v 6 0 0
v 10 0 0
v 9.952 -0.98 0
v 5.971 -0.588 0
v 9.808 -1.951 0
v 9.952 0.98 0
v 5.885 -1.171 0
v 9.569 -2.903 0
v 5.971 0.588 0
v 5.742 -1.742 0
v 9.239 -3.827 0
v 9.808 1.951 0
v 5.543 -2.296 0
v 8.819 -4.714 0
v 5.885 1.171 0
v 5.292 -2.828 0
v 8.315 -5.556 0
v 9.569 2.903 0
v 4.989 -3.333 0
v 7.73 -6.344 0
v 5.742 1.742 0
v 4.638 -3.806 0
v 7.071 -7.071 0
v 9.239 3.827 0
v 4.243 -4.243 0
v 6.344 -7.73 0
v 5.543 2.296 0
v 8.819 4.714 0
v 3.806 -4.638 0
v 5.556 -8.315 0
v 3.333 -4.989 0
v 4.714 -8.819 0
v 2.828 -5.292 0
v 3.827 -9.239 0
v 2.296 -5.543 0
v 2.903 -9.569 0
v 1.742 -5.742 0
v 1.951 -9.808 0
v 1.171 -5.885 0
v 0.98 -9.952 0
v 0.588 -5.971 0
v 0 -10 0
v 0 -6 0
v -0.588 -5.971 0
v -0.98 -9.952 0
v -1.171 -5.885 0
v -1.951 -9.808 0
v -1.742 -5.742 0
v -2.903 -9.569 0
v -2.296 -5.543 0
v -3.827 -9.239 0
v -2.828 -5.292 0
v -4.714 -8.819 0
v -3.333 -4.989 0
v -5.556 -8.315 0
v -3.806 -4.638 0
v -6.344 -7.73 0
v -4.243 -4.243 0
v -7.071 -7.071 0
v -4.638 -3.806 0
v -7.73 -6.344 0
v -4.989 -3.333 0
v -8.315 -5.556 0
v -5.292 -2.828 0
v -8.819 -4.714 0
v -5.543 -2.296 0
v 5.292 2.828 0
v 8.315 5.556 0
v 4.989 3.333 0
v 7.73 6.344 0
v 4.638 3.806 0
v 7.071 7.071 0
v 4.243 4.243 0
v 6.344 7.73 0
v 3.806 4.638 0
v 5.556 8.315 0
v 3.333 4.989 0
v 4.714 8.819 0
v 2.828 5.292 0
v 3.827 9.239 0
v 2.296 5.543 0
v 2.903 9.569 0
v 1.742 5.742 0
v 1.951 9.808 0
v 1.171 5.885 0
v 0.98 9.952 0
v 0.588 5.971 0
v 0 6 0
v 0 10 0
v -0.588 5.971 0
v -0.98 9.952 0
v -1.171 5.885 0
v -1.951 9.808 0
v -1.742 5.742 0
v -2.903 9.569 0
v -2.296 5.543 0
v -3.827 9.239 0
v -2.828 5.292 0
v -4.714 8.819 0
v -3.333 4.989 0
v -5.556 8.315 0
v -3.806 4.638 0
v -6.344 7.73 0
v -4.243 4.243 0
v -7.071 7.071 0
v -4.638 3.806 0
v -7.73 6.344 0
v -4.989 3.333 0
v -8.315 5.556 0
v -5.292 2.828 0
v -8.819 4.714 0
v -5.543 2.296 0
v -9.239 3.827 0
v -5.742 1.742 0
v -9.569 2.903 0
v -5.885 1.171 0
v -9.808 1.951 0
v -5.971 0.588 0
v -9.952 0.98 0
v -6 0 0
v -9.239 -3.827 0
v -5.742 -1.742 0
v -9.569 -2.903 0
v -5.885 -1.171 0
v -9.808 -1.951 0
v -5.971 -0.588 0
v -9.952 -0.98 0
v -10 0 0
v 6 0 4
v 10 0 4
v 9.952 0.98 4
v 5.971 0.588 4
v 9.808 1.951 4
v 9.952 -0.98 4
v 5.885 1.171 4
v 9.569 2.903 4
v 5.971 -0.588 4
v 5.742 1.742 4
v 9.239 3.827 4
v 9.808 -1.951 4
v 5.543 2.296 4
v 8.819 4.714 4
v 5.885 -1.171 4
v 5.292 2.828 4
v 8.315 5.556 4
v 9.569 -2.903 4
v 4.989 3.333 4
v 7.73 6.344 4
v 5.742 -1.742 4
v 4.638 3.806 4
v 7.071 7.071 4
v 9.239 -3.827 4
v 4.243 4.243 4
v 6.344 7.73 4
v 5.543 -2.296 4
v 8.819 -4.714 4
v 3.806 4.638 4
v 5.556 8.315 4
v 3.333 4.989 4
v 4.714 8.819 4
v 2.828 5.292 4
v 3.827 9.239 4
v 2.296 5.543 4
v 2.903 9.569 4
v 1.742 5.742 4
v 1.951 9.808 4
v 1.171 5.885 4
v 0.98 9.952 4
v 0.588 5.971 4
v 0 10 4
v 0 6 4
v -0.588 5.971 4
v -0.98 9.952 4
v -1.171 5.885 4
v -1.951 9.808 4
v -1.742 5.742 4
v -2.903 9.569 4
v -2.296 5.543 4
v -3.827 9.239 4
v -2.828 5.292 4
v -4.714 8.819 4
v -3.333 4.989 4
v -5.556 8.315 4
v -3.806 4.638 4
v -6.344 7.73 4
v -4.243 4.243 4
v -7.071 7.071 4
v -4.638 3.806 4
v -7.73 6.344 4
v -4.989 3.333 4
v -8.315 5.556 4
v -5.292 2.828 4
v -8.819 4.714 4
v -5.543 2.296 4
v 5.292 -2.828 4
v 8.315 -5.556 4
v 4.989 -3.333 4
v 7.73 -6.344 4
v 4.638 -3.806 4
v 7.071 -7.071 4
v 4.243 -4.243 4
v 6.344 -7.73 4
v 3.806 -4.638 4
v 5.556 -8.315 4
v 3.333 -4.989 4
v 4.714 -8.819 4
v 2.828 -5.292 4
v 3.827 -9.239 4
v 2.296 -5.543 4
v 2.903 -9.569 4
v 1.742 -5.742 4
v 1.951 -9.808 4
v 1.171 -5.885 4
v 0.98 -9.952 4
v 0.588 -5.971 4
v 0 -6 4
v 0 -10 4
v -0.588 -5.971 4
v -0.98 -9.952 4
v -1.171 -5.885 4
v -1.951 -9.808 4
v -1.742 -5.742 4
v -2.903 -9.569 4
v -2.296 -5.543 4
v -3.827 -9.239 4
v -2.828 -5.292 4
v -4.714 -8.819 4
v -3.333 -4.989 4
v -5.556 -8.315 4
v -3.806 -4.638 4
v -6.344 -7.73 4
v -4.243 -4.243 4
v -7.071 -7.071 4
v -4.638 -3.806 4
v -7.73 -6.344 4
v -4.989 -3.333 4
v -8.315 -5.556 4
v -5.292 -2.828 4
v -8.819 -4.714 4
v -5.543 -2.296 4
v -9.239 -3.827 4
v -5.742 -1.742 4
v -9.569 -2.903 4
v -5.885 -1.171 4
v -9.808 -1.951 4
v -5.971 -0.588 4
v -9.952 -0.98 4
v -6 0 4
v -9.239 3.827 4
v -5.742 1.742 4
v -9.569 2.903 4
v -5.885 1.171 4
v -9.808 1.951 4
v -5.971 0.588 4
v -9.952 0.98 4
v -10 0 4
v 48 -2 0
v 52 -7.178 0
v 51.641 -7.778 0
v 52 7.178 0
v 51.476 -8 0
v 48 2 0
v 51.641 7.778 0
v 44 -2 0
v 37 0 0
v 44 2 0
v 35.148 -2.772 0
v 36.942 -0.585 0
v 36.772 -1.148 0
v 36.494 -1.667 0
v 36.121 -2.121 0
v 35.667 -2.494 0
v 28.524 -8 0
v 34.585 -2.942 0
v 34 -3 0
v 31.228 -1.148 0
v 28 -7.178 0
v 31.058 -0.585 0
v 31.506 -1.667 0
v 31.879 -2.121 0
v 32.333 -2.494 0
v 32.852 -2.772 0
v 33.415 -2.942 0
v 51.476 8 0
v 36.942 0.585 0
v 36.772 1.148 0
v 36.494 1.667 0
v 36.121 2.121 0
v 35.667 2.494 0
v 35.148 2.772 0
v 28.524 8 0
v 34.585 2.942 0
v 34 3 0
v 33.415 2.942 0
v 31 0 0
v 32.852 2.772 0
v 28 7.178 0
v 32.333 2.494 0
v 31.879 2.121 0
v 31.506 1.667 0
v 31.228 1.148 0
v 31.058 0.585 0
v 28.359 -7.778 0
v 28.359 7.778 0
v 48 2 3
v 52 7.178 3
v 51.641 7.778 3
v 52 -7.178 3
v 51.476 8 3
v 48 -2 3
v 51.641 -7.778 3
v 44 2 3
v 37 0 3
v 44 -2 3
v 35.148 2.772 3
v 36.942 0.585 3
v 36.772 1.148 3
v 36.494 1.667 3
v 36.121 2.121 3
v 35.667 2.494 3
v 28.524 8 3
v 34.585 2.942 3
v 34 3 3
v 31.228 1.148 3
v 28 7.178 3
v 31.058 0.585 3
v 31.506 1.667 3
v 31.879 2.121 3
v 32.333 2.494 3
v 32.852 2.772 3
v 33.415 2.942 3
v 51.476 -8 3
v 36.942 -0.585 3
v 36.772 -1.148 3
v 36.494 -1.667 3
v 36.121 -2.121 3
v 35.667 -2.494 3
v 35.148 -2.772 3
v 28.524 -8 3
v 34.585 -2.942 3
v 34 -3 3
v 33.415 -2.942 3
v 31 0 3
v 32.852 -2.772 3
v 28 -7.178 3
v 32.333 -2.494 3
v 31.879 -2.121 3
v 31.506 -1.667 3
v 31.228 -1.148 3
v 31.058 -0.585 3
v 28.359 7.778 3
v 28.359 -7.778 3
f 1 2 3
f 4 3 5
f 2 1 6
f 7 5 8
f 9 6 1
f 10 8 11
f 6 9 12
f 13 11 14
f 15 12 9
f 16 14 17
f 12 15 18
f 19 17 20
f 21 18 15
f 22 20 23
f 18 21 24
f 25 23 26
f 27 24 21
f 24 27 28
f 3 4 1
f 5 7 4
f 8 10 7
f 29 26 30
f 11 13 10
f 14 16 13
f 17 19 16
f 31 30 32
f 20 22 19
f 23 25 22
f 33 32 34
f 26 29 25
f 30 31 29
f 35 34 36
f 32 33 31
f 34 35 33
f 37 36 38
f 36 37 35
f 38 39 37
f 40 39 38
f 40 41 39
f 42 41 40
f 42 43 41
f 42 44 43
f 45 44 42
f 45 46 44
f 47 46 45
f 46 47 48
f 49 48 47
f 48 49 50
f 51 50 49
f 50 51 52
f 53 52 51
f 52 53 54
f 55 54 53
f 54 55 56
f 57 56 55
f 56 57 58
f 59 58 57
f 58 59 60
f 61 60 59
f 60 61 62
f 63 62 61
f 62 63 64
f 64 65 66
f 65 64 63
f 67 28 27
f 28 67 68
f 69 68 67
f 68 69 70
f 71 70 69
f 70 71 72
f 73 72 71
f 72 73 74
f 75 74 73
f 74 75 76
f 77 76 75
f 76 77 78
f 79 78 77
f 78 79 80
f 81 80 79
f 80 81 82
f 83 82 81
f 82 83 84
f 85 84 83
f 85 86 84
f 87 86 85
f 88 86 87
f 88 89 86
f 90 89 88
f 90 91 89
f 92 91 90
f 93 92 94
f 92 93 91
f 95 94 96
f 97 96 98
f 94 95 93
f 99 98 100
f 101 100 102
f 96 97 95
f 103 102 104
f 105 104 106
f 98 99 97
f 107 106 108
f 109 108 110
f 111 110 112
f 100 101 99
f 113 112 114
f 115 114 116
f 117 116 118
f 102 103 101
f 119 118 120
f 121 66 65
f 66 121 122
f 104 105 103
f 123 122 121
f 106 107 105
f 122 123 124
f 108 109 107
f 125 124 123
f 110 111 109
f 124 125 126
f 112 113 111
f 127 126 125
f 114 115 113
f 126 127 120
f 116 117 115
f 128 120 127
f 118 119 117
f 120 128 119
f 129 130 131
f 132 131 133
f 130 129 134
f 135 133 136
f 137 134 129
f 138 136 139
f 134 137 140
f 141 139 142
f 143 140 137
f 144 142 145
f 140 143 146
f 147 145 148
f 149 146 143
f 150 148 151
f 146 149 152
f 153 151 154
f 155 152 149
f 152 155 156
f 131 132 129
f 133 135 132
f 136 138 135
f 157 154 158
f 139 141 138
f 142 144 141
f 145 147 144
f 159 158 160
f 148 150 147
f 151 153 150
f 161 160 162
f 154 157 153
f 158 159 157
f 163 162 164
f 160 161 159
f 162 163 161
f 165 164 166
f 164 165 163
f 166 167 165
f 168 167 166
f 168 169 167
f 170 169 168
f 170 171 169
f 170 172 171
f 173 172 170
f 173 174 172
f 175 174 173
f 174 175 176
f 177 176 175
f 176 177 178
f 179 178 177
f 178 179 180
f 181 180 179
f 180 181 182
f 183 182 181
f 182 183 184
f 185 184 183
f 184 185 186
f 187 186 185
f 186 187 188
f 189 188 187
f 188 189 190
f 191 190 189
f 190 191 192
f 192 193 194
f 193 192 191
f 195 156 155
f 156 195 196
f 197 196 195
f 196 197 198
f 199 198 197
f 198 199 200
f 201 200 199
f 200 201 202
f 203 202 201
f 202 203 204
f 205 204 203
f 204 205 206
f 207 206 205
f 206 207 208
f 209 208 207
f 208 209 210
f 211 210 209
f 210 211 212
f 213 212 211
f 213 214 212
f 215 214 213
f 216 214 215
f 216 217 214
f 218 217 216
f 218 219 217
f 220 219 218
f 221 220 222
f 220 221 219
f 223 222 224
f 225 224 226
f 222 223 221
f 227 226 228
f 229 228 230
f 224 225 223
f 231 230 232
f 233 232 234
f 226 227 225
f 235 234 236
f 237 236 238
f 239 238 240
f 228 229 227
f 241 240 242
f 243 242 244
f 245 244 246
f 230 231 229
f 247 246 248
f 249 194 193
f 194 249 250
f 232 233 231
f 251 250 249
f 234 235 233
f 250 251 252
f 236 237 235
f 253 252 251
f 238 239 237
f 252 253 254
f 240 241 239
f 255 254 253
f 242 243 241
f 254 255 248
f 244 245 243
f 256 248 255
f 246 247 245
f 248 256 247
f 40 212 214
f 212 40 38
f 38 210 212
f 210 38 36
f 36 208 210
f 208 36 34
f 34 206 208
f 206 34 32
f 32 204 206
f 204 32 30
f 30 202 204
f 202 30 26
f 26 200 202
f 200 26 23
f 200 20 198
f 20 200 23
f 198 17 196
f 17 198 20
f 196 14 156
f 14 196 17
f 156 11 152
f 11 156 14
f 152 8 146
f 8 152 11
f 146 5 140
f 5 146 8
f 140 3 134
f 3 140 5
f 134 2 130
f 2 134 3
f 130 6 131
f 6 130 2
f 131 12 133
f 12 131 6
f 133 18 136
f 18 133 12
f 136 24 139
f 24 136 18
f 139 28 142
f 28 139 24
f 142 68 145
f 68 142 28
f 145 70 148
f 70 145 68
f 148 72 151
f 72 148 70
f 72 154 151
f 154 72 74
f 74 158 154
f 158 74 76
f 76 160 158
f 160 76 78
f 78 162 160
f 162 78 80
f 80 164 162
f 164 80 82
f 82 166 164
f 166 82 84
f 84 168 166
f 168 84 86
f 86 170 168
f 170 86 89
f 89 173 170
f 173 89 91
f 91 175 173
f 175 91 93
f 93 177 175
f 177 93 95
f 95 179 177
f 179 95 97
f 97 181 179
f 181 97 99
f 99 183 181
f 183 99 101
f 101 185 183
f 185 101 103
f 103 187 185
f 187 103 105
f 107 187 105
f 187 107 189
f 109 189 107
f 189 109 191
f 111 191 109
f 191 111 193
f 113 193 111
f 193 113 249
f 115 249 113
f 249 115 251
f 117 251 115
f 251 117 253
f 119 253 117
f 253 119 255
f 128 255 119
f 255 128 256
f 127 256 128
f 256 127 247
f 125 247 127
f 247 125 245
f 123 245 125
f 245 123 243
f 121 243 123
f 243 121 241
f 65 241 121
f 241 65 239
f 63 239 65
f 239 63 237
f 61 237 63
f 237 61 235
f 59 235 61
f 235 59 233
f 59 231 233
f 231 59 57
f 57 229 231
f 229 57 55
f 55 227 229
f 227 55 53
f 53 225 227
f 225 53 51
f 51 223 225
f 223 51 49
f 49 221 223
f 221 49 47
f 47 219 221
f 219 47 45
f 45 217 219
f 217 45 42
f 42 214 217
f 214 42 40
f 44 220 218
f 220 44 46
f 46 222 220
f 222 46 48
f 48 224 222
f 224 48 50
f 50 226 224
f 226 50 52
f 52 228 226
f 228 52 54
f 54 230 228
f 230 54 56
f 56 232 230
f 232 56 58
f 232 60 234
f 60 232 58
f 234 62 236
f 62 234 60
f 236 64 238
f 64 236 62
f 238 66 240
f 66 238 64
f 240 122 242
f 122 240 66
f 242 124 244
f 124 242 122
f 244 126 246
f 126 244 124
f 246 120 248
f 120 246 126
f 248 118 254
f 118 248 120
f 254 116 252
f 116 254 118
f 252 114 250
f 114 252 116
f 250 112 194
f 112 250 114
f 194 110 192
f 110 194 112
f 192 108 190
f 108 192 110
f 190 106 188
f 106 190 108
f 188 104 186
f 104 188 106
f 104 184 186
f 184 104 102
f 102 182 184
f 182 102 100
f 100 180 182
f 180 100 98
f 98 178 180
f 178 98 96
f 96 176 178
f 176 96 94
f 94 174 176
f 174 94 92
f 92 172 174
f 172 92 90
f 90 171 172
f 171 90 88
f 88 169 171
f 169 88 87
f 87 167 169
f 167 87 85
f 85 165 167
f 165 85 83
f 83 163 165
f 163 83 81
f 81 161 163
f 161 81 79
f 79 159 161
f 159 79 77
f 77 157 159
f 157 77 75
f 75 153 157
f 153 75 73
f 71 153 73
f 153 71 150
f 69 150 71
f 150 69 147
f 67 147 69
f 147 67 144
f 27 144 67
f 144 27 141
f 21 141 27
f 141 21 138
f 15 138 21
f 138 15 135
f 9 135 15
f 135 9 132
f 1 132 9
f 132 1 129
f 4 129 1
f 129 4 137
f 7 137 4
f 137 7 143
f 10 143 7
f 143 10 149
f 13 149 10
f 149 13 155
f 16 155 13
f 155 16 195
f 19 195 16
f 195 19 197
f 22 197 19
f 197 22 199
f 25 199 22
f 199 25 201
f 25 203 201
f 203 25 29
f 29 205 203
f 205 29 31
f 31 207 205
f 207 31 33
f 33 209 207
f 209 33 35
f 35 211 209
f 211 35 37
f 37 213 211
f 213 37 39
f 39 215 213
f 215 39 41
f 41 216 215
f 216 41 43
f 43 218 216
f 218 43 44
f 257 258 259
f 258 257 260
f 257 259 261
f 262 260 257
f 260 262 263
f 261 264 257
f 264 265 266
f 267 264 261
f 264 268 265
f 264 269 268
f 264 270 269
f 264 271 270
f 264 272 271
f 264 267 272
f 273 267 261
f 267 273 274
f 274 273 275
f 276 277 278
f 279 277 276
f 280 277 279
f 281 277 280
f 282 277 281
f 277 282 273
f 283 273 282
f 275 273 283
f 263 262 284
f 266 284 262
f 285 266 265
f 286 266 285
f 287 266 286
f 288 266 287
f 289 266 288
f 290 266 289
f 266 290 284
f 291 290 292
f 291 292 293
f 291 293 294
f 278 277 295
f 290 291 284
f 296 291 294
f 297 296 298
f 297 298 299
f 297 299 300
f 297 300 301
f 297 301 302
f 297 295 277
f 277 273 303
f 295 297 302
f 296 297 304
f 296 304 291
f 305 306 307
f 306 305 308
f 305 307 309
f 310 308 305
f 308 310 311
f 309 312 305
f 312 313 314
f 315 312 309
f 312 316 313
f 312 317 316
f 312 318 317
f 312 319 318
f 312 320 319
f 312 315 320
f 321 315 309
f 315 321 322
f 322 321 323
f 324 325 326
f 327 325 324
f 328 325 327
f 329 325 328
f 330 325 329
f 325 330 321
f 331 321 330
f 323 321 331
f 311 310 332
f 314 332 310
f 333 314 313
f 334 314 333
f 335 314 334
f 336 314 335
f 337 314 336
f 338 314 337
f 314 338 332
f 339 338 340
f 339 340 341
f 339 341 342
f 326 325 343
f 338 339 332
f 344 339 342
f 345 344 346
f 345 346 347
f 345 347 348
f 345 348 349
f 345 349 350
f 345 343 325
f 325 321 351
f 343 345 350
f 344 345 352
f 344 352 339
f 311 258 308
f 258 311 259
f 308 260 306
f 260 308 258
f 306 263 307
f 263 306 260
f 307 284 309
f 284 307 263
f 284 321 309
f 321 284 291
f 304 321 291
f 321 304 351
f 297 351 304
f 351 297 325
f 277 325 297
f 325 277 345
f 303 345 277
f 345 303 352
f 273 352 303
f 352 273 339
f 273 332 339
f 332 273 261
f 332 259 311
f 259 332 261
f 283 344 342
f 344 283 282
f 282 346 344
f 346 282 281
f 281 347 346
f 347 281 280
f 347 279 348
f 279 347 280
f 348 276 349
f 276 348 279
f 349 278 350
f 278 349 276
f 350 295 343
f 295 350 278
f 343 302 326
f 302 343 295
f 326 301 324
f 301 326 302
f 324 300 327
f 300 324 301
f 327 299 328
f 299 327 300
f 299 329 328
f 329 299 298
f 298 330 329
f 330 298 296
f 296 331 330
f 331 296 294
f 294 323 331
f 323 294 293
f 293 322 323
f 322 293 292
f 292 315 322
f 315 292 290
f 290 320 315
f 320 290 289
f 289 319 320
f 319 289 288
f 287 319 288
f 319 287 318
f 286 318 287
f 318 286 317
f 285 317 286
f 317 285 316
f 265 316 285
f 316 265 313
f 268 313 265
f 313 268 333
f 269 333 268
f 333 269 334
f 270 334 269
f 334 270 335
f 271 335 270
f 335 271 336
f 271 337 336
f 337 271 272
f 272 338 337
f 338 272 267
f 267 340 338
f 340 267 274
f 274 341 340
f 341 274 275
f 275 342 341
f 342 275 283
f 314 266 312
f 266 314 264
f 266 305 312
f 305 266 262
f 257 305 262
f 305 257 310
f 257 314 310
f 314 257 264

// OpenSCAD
// Original CanvasNet test fixture: 2D boolean operations distributed into extrusions.
$fn = 64;

// A ring: a disc of radius 10 minus a disc of radius 6, 4 tall, centered at the origin
linear_extrude(height = 4)
  difference() {
    circle(r = 10);
    circle(r = 6);
  }

// A plate centered at x = 40: a 24 x 16 rectangle trimmed by a disc of radius 14, with a round hole at x = -6
// and a square hole at x = +6 (relative to the plate center), 3 tall
translate([40, 0, 0])
  linear_extrude(height = 3)
    difference() {
      intersection() {
        square([24, 16], center = true);
        circle(r = 14);
      }
      translate([-6, 0]) circle(r = 3, $fn = 32);
      translate([6, 0]) square([4, 4], center = true);
    }
